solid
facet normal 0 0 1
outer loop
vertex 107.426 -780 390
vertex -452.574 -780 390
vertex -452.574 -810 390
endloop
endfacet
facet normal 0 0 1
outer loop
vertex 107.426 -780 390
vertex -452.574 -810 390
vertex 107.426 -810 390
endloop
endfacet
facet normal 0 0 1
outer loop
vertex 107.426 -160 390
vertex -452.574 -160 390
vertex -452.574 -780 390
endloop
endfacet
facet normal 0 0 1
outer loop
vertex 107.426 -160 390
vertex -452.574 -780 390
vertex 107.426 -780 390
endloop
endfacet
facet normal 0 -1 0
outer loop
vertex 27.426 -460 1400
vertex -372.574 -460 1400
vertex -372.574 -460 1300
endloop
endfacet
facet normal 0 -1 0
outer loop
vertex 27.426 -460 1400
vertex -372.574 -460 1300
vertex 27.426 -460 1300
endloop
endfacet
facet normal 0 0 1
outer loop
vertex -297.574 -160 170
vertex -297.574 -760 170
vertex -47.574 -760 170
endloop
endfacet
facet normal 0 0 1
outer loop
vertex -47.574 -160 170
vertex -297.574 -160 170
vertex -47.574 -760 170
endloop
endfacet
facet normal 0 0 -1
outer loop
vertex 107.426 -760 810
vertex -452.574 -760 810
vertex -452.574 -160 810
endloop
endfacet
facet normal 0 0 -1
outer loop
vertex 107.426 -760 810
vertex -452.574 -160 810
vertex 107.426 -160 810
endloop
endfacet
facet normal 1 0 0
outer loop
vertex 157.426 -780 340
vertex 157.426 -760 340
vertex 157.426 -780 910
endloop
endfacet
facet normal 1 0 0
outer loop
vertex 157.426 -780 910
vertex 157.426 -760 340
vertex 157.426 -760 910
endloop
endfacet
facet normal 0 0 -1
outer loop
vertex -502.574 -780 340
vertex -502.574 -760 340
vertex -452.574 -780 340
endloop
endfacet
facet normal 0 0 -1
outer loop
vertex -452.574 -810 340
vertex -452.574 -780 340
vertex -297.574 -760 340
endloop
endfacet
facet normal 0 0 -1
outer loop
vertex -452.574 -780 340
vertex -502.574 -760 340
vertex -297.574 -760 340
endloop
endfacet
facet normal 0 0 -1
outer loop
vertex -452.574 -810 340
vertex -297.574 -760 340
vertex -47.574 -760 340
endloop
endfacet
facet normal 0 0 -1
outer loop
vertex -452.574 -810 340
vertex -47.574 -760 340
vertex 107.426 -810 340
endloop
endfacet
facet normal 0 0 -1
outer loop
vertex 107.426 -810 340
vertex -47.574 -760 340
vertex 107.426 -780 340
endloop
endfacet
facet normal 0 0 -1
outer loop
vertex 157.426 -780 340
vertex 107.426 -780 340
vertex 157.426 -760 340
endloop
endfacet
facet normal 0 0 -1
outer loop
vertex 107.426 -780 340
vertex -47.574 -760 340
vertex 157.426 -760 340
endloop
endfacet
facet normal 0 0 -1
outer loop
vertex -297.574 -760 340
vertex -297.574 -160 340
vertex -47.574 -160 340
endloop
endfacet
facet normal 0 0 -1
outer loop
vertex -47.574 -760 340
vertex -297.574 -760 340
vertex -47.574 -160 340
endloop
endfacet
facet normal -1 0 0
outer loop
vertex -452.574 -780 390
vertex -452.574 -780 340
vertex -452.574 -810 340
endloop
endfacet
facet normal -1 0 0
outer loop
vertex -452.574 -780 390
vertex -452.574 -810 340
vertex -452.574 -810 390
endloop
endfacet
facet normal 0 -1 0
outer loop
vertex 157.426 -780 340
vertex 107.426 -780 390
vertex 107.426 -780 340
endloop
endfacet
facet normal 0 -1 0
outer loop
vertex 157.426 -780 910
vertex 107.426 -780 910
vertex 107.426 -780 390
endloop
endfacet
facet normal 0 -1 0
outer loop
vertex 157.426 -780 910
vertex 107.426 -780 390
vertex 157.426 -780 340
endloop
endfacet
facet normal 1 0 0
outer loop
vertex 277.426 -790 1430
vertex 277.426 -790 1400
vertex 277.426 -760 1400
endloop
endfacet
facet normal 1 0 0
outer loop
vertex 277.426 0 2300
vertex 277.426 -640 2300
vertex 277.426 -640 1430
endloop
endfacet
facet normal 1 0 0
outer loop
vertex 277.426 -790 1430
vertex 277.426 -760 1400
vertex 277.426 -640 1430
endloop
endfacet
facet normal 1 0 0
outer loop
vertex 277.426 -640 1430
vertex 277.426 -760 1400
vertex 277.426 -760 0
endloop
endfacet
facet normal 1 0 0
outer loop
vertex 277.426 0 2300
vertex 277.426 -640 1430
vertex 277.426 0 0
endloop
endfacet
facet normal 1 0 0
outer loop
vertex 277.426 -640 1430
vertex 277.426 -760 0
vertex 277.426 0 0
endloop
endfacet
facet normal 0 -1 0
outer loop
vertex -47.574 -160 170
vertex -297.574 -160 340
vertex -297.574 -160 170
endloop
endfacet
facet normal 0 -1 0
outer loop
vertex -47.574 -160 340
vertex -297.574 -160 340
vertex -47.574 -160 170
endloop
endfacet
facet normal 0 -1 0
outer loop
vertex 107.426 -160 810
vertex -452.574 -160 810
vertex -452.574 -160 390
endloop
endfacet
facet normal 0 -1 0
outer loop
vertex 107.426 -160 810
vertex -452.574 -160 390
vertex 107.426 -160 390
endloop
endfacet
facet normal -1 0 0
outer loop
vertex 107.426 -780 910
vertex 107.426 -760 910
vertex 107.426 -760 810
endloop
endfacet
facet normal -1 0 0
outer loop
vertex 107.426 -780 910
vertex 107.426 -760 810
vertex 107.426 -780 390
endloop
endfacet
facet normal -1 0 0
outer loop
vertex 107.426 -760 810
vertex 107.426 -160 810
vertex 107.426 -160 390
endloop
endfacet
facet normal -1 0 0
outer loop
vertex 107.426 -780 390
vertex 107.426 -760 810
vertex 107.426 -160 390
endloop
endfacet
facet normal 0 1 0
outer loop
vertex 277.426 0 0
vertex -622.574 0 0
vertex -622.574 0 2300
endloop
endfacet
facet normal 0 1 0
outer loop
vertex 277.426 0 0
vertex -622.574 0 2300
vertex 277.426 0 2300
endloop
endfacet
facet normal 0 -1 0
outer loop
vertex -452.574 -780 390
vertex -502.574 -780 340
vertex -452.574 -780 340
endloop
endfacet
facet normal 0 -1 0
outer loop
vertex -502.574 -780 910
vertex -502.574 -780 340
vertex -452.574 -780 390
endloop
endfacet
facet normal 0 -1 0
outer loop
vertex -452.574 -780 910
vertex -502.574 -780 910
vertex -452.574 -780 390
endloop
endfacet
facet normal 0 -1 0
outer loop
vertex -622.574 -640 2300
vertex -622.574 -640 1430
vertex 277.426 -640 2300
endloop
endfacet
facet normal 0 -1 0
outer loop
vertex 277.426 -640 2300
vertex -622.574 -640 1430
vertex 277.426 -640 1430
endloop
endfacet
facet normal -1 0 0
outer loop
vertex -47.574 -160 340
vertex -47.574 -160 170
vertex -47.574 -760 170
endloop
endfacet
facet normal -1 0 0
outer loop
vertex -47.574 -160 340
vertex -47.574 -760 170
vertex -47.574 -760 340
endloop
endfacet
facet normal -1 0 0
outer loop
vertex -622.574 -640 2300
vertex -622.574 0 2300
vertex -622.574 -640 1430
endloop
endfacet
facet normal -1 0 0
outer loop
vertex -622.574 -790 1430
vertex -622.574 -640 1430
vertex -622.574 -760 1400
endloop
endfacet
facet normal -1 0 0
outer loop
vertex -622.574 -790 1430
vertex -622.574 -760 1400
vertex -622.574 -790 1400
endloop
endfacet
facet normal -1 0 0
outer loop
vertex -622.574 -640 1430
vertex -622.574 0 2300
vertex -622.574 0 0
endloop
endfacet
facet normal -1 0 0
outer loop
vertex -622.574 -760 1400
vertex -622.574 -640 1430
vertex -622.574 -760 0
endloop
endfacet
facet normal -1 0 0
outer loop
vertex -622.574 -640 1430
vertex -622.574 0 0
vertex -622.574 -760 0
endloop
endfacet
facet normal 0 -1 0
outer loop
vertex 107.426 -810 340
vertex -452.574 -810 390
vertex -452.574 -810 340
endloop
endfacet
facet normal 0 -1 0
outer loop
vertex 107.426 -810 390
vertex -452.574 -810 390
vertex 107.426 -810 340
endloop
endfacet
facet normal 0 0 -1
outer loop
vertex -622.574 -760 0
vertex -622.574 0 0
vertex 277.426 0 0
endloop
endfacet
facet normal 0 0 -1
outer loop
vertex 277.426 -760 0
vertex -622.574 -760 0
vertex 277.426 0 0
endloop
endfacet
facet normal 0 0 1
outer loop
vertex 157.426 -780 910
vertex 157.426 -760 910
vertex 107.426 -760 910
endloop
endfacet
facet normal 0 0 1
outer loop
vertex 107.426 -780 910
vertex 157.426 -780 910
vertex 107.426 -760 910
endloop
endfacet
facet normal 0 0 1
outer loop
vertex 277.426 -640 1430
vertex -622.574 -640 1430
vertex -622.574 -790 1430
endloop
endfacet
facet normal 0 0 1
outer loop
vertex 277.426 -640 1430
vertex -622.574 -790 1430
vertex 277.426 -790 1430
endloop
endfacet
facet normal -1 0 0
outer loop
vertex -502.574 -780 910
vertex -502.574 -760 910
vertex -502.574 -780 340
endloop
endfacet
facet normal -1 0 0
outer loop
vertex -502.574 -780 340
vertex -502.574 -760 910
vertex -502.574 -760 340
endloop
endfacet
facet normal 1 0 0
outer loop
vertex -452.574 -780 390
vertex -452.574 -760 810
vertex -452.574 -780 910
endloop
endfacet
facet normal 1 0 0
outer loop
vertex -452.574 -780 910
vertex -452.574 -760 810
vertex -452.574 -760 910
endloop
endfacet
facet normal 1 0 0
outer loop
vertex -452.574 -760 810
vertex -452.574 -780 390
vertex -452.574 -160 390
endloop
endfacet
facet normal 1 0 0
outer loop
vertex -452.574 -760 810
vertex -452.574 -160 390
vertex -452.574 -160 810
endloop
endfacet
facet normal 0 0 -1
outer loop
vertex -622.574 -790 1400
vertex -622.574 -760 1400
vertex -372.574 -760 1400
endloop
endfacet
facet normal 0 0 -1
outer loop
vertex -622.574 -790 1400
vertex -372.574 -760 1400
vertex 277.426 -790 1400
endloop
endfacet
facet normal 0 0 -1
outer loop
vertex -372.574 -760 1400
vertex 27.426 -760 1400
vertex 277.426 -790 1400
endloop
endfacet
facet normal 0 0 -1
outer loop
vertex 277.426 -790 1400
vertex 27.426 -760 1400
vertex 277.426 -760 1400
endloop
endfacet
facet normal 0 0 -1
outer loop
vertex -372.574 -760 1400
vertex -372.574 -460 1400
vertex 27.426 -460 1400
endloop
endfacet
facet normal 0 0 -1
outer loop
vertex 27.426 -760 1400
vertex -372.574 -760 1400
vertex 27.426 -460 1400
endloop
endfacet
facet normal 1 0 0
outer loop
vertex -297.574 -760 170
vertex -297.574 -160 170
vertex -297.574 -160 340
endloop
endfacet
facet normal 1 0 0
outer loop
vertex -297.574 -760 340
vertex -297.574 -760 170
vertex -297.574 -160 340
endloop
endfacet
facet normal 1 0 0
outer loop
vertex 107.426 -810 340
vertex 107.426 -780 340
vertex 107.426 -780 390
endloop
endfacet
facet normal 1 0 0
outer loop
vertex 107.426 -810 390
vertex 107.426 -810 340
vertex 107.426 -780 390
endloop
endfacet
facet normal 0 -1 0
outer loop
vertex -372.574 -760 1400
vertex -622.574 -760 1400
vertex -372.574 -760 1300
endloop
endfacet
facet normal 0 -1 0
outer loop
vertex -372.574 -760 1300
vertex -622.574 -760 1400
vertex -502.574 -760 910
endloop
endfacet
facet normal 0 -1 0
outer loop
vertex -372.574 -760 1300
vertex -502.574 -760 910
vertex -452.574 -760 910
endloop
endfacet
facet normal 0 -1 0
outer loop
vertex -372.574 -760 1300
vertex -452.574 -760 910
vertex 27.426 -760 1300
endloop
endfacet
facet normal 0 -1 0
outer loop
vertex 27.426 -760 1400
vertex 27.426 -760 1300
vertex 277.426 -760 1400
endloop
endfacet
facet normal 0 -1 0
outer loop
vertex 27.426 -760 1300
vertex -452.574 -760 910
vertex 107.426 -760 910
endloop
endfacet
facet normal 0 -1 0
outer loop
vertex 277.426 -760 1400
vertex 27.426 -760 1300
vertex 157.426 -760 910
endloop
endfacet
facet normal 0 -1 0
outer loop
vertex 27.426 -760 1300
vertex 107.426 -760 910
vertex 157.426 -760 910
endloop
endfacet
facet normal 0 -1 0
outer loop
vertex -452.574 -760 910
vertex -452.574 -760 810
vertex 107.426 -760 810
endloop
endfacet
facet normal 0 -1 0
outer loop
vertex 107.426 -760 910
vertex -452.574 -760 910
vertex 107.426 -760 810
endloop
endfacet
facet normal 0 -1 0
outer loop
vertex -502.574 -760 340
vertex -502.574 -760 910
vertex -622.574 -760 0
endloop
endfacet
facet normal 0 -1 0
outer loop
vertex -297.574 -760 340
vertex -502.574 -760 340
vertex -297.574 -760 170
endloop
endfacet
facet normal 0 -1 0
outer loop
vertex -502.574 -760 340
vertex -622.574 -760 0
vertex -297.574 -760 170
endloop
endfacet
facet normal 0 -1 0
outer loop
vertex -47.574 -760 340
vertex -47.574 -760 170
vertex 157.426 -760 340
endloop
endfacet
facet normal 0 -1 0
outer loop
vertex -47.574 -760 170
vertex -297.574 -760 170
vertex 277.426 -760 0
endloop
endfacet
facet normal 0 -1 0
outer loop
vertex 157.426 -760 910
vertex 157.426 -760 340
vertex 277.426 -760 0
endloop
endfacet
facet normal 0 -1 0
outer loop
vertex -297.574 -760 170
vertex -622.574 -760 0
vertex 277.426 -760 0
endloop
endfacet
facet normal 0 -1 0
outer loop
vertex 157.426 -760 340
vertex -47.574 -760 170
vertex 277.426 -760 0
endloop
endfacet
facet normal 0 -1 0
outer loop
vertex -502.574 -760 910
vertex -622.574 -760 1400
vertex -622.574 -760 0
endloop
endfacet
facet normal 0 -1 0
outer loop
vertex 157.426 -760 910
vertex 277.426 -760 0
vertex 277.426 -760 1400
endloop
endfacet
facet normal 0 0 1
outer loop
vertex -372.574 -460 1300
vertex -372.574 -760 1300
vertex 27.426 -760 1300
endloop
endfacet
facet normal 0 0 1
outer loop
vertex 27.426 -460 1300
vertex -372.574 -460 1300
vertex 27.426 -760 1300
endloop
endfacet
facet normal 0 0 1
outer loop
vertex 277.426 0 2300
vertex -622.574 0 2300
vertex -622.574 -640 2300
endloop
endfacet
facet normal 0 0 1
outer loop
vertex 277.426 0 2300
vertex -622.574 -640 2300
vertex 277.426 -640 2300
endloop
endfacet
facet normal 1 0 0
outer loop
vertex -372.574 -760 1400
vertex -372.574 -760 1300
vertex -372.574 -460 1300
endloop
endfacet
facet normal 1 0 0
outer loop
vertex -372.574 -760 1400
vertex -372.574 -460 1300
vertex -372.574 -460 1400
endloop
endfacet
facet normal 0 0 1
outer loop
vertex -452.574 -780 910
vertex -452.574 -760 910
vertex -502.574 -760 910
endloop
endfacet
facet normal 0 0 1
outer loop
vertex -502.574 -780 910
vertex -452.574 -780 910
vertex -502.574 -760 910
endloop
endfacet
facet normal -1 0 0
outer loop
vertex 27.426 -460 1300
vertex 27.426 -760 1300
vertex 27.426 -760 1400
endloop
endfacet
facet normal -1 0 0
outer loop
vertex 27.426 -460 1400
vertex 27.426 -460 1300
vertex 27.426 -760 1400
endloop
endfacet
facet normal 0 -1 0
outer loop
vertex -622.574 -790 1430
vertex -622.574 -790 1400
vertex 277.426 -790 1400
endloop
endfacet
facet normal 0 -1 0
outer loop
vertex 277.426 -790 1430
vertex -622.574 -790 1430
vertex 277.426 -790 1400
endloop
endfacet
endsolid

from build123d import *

# Parameters (mm, degrees)
F0_W      = 900
F0_H      = 760
F1_DEPTH  = 1400
F2_W      = 900
F2_H      = 640
F3_DEPTH  = 900
F4_W      = 900
F4_H      = 120
F4_H_2    = 30
F5_DEPTH  = 30
F7_DEPTH  = 20
F8_W      = 560
F8_H      = 50
F9_DEPTH  = 50
F10_W     = 250
F10_H     = 170
F11_DEPTH = 600
F12_W     = 560
F12_H     = 420
F13_DEPTH = 600
F14_W     = 400
F14_H     = 100
F15_DEPTH = 300


with BuildPart() as f1:
    # F0 (on Top) → F1 (new body)
    with BuildSketch(Plane.XY):
        with Locations((-172.5741102403, -380)):
            Rectangle(F0_W, F0_H)
    extrude(amount=F1_DEPTH)

    # F2 (on face) → F3 (join)
    with BuildSketch(Plane.XY.offset(1400)):
        with Locations((-172.5741102403, -320)):
            Rectangle(F2_W, F2_H)
    extrude(amount=F3_DEPTH)

    # F4 (on face) → F5 (join)
    with BuildSketch(Plane.XY.offset(1400)):
        with Locations((-172.5741102403, -700)):
            Rectangle(F4_W, F4_H)
        with Locations((-172.5741102403, -775)):
            Rectangle(F4_W, F4_H_2)
    extrude(amount=F5_DEPTH)

    # F6 (on face) → F7 (join)
    with BuildSketch(Plane.XZ.offset(760)):
        Polygon((-452.5741102403, 340), (-452.5741102403, 390), (-452.5741102403, 810), (-452.5741102403, 910), (-502.5741102403, 910), (-502.5741102403, 340), align=None)
        Polygon((107.4258897597, 810), (107.4258897597, 390), (107.4258897597, 340), (157.4258897597, 340), (157.4258897597, 910), (107.4258897597, 910), align=None)
    extrude(amount=F7_DEPTH)

    # F8 (on face) → F9 (join)
    with BuildSketch(Plane.XZ.offset(760)):
        with Locations((-172.5741102403, 365)):
            Rectangle(F8_W, F8_H)
    extrude(amount=F9_DEPTH)

    # F10 (on face) → F11 (cut)
    with BuildSketch(Plane.XZ.offset(760)):
        with Locations((-172.5741102403, 255)):
            Rectangle(F10_W, F10_H)
    extrude(amount=-F11_DEPTH, mode=Mode.SUBTRACT)

    # F12 (on face) → F13 (cut)
    with BuildSketch(Plane.XZ.offset(760)):
        with Locations((-172.5741102403, 600)):
            Rectangle(F12_W, F12_H)
    extrude(amount=-F13_DEPTH, mode=Mode.SUBTRACT)

    # F14 (on face) → F15 (cut)
    with BuildSketch(Plane.XZ.offset(760)):
        with Locations((-172.5741102403, 1350)):
            Rectangle(F14_W, F14_H)
    extrude(amount=-F15_DEPTH, mode=Mode.SUBTRACT)


solid = f1.part
